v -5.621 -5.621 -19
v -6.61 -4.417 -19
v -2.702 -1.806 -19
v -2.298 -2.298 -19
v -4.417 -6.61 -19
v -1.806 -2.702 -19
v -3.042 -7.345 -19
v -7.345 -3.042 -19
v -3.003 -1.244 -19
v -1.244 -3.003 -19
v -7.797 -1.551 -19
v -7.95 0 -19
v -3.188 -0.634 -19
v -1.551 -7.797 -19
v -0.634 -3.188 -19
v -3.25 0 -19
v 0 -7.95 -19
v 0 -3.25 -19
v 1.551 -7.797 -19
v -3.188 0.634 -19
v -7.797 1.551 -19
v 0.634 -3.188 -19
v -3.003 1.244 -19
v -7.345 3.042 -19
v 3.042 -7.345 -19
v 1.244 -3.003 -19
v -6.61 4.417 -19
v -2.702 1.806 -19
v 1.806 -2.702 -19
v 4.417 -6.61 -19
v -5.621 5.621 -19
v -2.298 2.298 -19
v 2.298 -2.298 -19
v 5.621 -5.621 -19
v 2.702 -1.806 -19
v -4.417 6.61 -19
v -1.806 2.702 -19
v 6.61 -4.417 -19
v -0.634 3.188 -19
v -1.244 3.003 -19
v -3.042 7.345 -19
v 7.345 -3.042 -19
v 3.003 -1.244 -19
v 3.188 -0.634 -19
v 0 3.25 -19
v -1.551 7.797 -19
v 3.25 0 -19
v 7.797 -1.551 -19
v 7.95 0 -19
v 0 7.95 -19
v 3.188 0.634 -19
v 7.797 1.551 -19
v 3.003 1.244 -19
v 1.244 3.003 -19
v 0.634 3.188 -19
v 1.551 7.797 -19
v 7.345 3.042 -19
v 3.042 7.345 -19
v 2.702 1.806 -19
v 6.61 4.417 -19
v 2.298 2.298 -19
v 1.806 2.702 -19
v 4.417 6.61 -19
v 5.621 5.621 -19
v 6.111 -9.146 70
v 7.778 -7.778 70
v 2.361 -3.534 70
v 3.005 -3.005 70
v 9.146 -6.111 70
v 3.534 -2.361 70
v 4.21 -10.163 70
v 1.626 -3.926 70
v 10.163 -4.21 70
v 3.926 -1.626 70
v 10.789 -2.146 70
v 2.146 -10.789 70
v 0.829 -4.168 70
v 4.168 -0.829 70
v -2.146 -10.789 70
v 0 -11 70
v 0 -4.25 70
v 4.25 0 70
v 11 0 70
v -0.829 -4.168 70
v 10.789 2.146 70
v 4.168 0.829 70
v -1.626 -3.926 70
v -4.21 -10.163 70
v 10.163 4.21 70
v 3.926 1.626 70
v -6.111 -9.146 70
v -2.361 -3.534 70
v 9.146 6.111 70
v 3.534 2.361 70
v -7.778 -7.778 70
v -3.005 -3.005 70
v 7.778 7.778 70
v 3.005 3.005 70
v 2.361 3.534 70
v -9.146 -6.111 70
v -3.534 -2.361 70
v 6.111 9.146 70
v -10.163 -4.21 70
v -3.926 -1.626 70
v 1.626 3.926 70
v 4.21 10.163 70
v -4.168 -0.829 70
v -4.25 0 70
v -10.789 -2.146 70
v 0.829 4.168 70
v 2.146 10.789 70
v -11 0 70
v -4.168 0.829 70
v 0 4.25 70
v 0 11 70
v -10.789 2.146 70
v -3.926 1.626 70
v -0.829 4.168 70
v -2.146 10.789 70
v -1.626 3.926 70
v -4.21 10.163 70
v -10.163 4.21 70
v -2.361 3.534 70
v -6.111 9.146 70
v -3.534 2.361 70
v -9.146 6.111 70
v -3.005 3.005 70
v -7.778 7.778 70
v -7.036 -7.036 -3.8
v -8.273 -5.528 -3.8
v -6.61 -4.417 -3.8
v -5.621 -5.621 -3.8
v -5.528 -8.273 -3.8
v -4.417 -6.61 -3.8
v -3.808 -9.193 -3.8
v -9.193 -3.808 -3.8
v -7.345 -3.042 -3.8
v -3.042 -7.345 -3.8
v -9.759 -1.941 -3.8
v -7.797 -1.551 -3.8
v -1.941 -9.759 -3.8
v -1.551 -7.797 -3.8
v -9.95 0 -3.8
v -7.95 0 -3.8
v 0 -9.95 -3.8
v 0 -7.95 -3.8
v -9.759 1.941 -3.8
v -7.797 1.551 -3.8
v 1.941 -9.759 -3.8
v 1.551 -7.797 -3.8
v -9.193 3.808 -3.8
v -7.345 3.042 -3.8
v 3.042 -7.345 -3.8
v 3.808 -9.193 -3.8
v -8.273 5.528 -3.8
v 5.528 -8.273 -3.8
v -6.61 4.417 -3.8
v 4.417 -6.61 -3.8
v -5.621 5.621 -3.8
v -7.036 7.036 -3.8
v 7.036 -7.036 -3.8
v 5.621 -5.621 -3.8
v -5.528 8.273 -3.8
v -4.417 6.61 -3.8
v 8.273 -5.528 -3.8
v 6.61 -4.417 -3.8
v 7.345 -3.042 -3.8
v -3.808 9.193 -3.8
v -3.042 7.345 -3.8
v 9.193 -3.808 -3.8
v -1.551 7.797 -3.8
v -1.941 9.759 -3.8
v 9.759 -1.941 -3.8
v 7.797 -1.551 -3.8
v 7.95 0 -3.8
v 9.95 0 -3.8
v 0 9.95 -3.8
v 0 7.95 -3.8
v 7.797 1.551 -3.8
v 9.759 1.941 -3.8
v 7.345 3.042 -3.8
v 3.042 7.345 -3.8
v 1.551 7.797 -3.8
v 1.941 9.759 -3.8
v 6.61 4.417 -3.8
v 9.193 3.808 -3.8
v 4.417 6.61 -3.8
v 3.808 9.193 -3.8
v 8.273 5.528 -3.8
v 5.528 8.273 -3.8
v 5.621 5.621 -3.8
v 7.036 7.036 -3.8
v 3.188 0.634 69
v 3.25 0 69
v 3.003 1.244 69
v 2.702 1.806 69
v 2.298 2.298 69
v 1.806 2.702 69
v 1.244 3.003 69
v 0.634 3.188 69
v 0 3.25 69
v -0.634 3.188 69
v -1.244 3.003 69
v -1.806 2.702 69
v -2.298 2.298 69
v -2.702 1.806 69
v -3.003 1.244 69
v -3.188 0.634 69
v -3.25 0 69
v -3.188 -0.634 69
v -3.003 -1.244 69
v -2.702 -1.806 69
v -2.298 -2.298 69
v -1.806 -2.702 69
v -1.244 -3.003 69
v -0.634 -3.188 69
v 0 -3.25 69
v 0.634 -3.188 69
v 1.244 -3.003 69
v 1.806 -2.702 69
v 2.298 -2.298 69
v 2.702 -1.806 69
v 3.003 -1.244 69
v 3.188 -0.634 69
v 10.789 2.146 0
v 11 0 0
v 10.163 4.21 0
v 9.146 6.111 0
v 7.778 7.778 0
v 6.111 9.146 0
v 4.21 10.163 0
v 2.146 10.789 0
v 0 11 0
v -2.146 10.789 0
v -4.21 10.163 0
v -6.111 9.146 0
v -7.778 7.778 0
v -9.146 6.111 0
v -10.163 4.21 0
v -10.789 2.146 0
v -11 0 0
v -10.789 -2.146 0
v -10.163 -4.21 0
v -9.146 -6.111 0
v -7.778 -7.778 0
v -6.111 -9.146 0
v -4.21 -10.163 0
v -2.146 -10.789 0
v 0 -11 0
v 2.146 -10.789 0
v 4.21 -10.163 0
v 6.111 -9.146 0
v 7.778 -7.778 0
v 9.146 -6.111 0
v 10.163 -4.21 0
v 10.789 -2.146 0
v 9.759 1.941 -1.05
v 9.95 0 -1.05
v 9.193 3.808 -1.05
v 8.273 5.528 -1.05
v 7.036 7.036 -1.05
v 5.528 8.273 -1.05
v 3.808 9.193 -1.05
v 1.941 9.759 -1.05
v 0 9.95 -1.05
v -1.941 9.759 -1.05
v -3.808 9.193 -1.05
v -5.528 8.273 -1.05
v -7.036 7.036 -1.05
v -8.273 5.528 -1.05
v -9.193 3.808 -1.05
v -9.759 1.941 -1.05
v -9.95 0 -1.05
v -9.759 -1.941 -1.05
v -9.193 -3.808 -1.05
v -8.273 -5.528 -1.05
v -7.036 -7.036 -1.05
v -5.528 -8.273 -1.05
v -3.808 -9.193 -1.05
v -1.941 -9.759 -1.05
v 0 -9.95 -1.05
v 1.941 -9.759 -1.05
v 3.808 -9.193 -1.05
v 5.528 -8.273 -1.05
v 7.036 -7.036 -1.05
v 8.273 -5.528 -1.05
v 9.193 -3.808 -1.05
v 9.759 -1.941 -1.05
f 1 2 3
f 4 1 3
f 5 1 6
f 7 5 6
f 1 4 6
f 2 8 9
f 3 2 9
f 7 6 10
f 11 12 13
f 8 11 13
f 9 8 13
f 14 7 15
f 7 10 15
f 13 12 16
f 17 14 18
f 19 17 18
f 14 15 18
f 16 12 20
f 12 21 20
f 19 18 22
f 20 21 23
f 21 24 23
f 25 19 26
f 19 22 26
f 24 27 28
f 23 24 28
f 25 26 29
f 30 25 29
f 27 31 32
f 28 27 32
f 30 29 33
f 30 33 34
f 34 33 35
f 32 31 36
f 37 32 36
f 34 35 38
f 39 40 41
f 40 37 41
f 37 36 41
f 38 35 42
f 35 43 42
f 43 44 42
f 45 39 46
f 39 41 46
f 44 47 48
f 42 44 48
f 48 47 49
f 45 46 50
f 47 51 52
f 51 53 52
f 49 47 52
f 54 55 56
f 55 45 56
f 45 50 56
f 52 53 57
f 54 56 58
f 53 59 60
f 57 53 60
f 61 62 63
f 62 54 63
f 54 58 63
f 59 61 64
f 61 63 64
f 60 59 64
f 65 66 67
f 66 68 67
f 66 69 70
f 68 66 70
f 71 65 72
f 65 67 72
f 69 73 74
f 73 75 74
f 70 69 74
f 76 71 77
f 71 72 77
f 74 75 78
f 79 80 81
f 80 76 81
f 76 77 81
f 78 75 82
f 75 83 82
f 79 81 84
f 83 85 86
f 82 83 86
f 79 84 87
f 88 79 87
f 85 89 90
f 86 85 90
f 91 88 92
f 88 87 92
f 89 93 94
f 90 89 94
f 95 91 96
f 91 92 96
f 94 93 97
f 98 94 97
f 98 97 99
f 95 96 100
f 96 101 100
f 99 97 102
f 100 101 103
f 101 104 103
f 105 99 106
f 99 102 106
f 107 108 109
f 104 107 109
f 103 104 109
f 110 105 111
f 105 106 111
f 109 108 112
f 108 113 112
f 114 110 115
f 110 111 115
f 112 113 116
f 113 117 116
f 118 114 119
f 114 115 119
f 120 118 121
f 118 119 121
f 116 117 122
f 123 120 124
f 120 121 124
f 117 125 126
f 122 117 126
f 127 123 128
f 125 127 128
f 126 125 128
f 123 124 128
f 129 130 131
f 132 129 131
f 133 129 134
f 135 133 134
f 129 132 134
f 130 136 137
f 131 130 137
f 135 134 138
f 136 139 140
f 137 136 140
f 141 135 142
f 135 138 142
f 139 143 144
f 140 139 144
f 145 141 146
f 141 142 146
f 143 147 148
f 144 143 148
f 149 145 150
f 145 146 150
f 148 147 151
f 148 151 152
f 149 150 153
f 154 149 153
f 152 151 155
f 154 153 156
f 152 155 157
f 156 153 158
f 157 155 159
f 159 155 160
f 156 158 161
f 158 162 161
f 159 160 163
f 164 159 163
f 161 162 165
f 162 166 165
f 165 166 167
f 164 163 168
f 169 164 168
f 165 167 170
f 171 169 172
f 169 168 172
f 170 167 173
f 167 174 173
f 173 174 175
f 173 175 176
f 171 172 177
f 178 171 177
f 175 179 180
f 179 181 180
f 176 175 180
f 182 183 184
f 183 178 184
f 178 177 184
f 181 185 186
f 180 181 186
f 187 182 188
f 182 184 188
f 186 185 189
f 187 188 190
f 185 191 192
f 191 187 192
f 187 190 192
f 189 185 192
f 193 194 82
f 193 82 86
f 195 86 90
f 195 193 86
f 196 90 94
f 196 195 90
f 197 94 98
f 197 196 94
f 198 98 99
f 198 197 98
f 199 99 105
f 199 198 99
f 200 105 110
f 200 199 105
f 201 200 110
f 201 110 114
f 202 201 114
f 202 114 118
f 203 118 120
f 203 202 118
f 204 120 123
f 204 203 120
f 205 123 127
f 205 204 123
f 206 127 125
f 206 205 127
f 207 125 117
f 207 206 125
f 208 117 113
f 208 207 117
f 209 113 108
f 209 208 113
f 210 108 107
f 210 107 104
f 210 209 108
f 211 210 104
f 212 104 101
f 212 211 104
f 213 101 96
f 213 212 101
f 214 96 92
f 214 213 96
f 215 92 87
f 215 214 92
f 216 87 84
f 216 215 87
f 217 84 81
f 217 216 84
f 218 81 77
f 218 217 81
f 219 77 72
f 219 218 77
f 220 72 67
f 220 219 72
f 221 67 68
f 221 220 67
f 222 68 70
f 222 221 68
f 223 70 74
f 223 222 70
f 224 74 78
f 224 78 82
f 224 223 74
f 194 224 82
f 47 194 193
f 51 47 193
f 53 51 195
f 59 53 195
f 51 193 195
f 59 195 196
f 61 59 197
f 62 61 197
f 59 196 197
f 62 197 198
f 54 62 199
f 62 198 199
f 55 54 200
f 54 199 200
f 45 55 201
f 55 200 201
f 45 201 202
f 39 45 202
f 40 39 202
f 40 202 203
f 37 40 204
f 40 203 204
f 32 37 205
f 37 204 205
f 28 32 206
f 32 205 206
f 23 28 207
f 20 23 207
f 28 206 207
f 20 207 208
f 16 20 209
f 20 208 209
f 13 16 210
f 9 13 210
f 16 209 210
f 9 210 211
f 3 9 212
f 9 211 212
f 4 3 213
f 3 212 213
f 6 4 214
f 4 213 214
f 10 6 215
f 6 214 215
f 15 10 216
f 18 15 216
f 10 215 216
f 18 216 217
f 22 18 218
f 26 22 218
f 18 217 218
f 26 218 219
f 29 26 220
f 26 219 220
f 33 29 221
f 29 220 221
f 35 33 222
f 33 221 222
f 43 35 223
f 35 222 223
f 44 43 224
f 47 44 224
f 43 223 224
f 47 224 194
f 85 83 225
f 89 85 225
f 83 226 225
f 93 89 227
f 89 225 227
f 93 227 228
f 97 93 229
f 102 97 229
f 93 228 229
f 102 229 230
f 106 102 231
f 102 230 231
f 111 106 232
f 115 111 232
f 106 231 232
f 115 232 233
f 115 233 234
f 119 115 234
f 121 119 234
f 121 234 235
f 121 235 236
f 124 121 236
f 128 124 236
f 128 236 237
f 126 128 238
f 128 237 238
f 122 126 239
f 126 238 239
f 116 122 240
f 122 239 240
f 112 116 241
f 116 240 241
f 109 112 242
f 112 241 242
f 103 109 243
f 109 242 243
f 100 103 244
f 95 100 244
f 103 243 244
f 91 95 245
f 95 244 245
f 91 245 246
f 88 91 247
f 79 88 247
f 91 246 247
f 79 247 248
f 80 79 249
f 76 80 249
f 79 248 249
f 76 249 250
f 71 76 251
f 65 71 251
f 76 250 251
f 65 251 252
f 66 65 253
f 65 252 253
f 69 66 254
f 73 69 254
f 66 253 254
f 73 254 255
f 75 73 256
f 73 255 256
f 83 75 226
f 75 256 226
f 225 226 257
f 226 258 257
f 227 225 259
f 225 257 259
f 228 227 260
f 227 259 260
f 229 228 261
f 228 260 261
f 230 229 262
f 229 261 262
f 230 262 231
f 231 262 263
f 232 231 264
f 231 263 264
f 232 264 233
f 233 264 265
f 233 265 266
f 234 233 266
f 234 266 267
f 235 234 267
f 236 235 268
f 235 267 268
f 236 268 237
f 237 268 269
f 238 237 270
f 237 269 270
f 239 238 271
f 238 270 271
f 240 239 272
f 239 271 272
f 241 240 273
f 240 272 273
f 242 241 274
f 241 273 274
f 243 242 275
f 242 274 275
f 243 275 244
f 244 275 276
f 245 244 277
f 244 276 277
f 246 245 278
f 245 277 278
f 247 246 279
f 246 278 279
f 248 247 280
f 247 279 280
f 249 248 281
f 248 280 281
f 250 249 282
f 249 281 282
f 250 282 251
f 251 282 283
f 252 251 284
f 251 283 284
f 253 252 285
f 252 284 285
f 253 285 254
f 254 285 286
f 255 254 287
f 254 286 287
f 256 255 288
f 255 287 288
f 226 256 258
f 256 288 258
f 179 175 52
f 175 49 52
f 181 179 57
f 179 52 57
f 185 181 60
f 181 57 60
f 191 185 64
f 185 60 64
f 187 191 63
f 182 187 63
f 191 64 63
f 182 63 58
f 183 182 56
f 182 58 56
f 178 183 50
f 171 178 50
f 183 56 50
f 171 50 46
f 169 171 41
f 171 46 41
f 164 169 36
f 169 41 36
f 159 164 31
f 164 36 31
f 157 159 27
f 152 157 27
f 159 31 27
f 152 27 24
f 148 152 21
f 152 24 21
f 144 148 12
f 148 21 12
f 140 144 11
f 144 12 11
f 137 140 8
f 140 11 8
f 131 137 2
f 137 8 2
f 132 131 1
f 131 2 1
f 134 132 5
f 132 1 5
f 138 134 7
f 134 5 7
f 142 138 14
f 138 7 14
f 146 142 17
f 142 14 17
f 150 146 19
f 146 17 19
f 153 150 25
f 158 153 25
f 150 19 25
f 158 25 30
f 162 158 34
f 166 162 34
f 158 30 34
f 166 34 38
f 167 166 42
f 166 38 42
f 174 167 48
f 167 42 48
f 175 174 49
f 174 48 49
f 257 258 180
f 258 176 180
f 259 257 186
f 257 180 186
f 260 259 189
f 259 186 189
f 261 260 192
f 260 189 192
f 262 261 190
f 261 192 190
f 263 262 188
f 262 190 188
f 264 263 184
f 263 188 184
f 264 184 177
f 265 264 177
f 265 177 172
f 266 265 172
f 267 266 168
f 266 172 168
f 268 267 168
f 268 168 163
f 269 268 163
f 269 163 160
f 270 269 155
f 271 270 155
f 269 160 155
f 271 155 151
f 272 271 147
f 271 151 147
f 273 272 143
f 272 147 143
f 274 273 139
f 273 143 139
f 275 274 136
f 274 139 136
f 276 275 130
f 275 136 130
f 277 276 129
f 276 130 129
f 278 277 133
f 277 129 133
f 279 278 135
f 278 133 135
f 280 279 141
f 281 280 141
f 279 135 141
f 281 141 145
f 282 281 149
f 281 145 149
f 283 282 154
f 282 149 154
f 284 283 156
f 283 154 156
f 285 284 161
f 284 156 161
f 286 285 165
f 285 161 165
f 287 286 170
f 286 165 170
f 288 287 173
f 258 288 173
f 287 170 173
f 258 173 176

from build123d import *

# Parameters (mm, degrees)
CHAMFER_SIZE = 1


with BuildPart() as part:
    # Sketch → Revolution (revolve)
    with BuildSketch(Plane.XZ):
        Polygon((3.25, 70), (11, 70), (11, 0), (9.95, -1.05), (9.95, -3.8), (7.95, -3.8), (7.95, -19), (3.25, -19), align=None)
    revolve(axis=Axis((0, 0, 0), (0, 0, 1)))

    # Chamfer
    chamfer_edges = [part.edges().sort_by_distance(p)[0] for p in [
        (-3.25, 0, 70),
    ]]
    chamfer(chamfer_edges, length=CHAMFER_SIZE)


solid = part.part
